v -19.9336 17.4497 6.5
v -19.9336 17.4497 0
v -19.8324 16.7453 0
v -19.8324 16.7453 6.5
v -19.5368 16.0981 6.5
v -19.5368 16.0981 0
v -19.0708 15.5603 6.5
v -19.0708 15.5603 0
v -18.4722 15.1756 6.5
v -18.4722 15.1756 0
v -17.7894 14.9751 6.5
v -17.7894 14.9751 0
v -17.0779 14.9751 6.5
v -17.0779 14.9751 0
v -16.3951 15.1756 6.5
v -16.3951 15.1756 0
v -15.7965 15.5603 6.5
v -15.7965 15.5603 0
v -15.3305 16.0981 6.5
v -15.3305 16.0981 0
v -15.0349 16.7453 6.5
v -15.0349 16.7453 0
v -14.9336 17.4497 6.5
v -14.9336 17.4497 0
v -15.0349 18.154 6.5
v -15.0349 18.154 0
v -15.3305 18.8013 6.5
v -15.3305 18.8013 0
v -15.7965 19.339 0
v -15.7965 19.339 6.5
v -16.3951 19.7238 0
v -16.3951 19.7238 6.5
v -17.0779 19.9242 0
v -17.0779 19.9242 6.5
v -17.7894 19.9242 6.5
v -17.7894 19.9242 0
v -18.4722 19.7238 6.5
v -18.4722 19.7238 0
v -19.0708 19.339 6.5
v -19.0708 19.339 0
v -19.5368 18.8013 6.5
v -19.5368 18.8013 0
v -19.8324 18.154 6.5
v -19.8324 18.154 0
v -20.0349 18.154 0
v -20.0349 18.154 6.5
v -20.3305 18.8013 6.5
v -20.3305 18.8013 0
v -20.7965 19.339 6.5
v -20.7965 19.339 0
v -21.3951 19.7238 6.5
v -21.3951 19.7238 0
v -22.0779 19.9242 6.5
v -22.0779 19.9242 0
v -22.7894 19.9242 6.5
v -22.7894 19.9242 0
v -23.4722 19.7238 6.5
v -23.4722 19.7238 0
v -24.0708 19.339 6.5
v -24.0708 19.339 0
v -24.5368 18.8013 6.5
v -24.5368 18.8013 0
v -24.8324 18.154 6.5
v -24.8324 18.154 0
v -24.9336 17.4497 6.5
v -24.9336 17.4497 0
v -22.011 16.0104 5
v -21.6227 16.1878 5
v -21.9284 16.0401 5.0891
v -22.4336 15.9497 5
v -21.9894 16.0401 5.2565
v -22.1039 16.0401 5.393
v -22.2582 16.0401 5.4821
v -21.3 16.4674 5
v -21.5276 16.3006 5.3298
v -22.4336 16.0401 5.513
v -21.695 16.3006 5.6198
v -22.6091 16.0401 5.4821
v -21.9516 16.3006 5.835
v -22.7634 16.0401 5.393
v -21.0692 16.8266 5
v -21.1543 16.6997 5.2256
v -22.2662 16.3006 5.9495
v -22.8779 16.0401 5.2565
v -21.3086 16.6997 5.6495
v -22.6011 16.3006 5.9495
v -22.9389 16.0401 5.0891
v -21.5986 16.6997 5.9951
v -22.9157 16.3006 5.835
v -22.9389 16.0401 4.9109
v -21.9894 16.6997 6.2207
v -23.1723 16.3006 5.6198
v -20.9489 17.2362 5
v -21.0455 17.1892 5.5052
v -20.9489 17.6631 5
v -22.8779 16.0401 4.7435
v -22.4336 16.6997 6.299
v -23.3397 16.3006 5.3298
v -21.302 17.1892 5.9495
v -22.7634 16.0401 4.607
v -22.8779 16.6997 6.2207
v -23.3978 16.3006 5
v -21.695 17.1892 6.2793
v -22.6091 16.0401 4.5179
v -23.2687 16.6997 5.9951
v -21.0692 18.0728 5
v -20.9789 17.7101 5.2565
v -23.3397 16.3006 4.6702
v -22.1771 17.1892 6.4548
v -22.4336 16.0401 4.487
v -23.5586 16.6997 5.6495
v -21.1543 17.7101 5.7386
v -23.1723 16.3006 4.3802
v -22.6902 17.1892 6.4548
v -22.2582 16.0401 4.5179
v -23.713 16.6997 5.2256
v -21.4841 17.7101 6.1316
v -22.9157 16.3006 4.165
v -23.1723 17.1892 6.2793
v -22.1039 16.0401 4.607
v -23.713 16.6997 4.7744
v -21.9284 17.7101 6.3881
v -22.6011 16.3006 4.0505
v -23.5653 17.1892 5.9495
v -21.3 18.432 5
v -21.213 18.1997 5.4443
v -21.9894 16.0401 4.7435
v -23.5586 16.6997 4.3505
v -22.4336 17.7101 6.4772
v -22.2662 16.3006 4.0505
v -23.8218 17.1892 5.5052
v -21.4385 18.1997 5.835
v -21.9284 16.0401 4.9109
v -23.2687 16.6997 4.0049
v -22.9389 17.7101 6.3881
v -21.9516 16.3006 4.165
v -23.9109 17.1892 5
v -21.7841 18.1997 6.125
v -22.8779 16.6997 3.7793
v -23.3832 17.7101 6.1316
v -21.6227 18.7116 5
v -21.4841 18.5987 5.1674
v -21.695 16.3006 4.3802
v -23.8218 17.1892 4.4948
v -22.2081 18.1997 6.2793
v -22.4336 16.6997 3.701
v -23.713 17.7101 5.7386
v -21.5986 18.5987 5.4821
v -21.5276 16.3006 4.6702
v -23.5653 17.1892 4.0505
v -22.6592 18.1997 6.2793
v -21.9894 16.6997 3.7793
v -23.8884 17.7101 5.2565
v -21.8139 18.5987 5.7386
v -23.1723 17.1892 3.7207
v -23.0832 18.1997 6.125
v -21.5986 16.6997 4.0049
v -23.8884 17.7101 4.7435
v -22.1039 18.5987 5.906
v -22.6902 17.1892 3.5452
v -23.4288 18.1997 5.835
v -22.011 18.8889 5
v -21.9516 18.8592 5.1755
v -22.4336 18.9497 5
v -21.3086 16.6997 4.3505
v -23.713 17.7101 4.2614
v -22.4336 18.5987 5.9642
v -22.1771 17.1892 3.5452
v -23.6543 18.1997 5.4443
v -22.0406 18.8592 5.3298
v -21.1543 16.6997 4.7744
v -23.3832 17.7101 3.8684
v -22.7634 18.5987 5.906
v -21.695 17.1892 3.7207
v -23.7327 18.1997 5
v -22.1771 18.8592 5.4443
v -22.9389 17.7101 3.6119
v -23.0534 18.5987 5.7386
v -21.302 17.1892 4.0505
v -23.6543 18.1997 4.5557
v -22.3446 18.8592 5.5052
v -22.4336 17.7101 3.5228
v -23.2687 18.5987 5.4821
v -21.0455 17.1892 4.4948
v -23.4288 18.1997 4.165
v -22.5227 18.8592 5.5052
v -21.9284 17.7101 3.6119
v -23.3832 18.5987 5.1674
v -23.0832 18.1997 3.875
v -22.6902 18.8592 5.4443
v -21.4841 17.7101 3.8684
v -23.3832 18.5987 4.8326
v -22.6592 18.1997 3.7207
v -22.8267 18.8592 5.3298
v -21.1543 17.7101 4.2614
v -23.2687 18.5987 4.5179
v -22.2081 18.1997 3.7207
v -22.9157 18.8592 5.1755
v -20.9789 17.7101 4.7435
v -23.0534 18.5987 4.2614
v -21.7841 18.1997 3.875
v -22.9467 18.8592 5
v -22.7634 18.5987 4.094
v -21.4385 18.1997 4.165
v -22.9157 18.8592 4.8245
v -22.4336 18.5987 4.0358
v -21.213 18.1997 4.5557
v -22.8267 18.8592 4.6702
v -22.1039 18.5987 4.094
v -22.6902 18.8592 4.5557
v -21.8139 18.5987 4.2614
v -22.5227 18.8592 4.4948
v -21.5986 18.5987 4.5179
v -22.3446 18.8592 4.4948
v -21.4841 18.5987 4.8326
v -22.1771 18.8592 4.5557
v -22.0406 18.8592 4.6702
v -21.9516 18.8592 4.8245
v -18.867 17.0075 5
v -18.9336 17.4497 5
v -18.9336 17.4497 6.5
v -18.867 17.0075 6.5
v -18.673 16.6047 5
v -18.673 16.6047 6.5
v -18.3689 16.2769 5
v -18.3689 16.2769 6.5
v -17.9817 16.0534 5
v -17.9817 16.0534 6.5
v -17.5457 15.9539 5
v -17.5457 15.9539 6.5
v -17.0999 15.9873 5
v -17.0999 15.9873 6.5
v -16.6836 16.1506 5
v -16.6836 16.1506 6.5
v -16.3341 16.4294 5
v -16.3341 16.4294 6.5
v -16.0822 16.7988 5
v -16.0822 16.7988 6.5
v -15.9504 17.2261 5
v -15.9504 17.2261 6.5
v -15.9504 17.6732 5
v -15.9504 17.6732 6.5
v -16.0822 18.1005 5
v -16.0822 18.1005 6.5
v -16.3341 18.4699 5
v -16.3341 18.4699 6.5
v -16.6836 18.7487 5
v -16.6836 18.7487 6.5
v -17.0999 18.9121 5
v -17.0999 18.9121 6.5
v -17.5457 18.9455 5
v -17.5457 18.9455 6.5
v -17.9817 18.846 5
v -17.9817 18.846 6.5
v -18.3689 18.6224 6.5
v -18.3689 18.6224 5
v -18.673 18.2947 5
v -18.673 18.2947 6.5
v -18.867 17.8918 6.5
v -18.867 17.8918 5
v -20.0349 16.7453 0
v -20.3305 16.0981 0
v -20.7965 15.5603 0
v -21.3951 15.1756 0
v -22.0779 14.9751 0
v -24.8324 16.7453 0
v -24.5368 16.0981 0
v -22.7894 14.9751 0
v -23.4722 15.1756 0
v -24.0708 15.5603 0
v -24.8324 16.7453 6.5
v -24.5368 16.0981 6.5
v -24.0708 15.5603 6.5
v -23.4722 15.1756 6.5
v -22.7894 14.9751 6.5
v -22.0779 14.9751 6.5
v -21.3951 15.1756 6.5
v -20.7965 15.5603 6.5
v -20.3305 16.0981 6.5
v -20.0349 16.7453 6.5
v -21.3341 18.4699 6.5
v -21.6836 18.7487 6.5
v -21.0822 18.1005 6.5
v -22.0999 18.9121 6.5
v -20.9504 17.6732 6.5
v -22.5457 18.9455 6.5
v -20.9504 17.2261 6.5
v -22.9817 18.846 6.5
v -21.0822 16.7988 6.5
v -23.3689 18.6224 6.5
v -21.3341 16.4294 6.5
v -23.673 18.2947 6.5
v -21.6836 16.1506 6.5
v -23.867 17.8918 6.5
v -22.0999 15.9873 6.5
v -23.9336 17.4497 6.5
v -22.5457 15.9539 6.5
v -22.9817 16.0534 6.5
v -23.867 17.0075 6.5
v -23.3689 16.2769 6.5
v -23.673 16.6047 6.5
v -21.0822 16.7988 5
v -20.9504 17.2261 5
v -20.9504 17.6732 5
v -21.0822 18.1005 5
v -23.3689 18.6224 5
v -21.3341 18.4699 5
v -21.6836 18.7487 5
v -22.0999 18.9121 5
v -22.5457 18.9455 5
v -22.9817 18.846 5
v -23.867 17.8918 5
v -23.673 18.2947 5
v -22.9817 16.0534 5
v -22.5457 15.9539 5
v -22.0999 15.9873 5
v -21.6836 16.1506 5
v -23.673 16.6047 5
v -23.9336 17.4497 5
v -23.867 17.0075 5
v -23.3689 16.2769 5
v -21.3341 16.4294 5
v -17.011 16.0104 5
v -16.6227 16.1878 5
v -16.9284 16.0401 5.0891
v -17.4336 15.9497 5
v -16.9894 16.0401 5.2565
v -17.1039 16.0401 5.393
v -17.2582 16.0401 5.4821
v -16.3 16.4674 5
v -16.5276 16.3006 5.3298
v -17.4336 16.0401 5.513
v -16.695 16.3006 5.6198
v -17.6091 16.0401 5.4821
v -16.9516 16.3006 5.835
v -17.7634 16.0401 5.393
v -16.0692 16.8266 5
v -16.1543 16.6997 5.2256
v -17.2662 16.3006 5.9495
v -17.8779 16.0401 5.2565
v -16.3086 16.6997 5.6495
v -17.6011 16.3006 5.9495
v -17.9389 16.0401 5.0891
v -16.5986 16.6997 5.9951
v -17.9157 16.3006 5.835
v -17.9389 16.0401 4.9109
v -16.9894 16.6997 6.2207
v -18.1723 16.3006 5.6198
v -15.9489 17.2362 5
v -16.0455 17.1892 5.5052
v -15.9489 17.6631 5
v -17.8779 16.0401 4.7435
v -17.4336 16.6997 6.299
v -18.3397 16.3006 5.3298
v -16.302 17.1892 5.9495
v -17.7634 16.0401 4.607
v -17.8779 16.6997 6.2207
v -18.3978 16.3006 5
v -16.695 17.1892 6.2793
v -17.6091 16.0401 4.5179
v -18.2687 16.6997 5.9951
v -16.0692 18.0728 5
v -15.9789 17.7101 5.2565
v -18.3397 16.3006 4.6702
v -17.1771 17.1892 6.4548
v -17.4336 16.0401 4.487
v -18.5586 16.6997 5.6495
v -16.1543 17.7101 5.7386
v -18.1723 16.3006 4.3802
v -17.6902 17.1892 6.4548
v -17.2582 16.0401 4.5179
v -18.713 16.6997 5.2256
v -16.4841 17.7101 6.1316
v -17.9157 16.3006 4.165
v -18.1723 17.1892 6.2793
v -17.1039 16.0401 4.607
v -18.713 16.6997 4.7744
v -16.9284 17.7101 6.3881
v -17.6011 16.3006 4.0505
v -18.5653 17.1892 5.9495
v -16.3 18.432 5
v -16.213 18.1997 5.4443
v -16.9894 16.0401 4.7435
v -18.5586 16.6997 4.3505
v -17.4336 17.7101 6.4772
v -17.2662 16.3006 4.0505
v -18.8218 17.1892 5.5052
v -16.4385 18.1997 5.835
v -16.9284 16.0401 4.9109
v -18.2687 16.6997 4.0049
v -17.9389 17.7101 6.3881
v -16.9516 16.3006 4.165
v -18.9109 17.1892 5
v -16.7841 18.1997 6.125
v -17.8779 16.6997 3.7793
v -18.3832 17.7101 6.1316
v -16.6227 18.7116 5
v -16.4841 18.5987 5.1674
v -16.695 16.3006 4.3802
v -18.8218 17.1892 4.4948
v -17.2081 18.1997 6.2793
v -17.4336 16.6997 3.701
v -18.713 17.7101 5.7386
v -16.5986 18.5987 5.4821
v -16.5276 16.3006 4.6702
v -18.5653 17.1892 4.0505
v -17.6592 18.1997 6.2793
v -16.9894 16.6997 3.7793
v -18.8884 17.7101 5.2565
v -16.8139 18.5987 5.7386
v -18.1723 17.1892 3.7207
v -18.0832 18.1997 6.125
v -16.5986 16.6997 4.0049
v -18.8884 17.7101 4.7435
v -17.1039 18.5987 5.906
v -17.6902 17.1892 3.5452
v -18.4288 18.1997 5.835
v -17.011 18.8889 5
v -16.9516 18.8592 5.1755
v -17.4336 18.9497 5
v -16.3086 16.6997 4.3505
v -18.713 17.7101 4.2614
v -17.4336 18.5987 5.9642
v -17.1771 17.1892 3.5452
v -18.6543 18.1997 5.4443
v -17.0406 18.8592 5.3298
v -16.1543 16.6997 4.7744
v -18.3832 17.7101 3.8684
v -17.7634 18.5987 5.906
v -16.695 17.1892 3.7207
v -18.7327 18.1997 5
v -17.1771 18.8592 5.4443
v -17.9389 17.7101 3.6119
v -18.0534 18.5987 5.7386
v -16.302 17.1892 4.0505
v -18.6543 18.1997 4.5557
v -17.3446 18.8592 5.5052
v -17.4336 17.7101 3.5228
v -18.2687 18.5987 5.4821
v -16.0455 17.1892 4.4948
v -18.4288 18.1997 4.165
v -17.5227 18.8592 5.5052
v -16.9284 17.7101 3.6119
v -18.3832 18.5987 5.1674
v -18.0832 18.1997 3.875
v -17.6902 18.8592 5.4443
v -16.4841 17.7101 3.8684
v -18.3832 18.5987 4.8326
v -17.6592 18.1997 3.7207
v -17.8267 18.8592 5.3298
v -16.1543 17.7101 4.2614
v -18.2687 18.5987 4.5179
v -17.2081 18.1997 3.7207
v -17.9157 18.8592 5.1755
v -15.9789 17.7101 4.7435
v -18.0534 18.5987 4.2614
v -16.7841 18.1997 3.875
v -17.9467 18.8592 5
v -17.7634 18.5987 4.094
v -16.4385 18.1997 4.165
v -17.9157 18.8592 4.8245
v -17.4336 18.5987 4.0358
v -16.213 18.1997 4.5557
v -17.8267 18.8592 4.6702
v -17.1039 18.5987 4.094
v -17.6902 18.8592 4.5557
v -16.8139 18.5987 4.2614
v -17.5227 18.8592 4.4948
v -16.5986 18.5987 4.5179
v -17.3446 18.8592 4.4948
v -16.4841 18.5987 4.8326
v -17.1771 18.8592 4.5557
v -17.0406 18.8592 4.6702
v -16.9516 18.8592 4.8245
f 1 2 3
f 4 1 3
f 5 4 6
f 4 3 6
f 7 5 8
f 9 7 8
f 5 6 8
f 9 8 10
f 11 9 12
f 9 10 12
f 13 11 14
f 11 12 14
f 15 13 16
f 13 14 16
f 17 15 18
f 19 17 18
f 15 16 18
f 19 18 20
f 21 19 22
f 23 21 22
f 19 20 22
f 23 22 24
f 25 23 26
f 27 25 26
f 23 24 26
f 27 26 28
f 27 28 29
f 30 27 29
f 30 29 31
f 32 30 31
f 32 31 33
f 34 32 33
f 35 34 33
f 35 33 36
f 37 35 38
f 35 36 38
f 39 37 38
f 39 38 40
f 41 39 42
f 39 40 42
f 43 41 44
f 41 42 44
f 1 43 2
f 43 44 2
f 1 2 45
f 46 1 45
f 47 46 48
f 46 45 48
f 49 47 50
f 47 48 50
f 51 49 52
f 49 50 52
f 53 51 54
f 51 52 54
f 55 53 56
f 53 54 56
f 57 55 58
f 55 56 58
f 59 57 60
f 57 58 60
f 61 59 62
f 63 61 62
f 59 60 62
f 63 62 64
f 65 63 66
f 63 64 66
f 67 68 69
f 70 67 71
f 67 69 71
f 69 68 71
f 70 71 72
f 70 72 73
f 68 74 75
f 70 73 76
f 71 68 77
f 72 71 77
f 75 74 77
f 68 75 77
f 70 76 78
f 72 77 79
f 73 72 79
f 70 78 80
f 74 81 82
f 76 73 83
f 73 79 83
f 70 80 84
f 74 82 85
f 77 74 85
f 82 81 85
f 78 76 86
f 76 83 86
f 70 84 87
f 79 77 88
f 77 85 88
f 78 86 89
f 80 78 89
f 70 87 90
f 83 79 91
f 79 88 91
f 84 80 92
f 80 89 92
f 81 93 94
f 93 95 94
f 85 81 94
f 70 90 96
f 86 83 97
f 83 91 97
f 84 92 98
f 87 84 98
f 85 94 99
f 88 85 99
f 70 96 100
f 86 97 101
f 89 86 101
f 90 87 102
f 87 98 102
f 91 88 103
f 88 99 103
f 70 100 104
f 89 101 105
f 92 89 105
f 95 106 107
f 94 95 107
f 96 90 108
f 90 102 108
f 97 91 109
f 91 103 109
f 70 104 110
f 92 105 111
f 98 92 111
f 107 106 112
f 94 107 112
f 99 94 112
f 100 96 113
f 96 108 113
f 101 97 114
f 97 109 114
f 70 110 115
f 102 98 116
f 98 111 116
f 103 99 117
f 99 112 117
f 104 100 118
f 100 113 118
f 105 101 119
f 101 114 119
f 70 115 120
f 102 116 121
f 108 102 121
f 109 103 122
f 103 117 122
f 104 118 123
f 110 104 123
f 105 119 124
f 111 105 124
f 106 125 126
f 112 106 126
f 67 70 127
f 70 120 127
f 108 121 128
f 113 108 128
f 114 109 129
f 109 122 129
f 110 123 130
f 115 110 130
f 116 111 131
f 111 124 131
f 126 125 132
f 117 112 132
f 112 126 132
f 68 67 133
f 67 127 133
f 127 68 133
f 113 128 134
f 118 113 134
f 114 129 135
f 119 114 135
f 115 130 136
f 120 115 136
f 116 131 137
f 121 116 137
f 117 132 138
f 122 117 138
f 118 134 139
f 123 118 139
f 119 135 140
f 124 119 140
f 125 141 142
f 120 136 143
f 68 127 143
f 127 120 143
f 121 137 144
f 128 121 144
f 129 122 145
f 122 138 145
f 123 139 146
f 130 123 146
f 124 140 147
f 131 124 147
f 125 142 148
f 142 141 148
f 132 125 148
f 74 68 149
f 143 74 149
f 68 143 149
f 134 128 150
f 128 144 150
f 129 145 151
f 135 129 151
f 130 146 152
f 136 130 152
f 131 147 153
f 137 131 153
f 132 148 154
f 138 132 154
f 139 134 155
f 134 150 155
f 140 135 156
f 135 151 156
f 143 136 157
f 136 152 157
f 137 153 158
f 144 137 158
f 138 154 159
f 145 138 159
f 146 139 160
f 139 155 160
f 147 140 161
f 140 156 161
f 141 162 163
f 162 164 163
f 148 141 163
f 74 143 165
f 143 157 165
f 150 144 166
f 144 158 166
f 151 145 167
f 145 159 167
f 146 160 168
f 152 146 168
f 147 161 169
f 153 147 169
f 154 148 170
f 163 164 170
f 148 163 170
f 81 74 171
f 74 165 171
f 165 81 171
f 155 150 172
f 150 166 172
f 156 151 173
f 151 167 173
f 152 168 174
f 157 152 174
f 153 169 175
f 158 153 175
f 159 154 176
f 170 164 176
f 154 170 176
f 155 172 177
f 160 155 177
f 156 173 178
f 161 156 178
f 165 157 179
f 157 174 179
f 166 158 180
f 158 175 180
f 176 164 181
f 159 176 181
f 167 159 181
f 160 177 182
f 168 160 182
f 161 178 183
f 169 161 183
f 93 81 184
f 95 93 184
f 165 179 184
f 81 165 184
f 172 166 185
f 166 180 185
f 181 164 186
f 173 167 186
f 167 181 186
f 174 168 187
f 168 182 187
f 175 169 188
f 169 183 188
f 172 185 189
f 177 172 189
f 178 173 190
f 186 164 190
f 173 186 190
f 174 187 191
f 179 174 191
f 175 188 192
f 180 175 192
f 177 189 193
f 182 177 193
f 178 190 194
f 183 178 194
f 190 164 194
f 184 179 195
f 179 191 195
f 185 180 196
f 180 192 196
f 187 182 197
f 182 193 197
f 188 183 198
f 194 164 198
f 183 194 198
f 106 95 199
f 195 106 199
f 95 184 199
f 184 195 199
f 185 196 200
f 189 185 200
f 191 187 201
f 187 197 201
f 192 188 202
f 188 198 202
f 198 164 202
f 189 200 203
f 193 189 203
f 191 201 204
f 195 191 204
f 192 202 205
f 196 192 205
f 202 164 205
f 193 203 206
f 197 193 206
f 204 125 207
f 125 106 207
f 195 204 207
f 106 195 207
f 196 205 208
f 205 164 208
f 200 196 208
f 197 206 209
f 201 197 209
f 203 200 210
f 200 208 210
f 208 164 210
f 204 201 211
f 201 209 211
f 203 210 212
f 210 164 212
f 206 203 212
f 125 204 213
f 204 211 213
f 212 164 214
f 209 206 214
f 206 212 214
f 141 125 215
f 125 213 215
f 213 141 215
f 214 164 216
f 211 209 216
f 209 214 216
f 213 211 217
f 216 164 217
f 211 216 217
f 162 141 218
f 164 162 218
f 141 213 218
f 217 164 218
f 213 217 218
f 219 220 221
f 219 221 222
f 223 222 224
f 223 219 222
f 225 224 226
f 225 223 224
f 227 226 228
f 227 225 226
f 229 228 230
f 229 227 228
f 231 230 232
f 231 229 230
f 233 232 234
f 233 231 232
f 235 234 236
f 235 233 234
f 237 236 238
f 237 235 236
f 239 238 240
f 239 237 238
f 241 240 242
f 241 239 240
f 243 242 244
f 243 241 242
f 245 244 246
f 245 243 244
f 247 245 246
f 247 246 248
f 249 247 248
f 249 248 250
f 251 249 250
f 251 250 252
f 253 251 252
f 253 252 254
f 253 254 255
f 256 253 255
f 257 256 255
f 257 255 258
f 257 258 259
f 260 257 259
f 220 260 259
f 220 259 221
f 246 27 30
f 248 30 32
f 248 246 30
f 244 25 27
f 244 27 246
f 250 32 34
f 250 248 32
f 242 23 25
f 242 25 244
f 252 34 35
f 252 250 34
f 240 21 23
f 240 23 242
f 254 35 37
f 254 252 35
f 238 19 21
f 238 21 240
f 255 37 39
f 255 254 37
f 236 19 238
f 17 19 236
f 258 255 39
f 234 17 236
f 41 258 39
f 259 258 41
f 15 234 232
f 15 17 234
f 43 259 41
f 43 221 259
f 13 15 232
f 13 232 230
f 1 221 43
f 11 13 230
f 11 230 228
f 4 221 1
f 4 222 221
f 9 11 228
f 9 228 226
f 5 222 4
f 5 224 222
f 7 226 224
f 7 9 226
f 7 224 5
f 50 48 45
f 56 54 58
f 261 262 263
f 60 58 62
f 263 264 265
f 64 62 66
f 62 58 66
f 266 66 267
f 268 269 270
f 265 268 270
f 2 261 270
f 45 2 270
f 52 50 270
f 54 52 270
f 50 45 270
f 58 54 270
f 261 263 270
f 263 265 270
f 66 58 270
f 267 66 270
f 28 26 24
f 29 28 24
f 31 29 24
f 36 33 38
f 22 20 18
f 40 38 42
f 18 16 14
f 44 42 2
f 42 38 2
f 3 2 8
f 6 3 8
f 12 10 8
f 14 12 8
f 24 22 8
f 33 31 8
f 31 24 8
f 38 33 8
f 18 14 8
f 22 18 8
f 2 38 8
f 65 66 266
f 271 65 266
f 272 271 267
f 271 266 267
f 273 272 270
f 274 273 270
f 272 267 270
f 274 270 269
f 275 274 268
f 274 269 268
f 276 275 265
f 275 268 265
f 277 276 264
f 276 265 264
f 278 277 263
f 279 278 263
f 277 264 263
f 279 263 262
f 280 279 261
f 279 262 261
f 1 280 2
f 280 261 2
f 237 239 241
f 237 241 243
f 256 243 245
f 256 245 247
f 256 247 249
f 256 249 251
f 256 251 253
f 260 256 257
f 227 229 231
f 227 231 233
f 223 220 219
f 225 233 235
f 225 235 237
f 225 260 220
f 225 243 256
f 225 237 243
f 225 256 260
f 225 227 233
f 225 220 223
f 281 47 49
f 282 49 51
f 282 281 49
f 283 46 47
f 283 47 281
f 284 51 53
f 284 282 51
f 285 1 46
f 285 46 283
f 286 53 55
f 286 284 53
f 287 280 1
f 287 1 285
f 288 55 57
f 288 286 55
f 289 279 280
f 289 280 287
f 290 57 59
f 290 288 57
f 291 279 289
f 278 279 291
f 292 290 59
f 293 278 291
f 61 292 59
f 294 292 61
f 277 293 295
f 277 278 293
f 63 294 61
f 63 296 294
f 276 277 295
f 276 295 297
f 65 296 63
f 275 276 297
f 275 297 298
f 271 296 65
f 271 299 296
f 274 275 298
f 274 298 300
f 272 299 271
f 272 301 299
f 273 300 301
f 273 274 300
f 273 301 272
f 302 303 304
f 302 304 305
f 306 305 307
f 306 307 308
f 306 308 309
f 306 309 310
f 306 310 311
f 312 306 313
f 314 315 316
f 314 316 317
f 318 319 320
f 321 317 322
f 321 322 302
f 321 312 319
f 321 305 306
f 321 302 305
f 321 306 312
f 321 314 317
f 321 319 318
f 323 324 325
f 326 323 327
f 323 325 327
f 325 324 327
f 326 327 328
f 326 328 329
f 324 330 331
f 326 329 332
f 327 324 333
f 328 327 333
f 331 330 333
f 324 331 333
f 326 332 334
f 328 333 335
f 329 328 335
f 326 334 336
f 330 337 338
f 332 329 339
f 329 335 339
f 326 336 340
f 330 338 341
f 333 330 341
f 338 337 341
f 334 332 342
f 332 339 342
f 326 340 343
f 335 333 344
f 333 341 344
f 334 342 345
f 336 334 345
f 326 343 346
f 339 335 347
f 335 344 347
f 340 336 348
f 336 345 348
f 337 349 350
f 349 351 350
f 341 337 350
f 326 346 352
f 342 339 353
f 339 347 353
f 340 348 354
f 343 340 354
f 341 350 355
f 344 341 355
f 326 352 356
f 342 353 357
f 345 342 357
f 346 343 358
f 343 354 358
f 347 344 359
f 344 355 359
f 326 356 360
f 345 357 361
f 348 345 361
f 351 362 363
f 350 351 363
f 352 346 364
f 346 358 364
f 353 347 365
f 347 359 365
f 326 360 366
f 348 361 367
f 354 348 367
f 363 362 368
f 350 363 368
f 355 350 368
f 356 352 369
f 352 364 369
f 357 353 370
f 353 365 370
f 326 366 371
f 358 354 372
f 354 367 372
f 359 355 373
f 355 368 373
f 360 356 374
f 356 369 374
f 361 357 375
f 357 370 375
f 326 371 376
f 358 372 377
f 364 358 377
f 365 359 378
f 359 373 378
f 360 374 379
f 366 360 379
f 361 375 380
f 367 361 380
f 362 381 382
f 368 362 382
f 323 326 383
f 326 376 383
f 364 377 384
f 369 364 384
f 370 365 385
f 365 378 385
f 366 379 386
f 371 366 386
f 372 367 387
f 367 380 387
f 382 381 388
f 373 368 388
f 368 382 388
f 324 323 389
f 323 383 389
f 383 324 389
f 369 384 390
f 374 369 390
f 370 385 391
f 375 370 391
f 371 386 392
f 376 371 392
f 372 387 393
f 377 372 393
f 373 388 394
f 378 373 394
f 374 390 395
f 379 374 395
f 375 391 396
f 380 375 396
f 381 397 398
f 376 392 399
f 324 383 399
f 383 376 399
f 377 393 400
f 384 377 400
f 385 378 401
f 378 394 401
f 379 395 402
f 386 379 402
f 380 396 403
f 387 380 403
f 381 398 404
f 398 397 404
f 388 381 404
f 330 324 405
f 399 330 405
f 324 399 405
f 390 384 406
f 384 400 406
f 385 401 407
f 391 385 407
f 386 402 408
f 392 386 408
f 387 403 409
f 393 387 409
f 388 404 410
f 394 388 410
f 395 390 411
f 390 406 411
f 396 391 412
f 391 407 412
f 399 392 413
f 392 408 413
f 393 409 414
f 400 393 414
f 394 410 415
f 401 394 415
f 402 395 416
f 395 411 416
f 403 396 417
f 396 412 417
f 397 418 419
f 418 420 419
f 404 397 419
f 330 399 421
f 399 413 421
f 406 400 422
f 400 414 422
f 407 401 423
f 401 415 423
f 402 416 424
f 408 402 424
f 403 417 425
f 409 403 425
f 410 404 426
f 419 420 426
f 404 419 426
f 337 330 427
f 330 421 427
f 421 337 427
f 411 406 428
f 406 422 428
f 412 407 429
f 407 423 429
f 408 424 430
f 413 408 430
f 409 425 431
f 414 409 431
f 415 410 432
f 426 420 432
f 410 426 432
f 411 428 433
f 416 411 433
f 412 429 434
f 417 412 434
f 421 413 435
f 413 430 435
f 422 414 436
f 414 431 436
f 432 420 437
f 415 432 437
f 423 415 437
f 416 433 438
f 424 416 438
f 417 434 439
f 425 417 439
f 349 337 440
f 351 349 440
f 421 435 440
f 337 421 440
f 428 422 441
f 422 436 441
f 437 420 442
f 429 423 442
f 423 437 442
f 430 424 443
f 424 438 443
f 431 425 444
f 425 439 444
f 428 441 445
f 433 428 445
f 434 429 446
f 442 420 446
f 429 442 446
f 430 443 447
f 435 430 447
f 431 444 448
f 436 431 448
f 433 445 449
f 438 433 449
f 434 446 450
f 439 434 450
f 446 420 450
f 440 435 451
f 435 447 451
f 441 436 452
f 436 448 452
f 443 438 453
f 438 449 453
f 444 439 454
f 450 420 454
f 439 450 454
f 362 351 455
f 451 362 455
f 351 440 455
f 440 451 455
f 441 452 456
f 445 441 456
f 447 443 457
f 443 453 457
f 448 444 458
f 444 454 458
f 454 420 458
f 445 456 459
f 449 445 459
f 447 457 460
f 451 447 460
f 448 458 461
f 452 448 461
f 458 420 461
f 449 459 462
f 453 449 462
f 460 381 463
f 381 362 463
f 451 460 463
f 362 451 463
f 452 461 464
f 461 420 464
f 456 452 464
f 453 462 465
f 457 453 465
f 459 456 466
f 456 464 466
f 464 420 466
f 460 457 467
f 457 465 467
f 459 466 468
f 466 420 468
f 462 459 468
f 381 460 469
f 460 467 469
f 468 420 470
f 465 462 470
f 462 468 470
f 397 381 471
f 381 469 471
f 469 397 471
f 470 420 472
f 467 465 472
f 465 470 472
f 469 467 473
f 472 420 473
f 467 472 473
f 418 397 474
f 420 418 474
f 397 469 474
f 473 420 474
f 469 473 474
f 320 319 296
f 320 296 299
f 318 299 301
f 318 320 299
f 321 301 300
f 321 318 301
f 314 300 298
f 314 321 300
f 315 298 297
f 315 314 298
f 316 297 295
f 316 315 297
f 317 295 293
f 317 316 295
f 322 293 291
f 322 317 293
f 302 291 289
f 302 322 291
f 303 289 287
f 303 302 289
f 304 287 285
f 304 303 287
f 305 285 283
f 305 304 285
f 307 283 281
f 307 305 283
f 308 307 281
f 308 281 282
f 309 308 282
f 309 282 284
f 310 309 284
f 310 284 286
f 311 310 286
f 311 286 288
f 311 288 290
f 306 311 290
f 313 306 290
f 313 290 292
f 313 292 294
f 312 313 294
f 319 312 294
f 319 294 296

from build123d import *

# Parameters (mm, degrees)
SKETCH_1_R      = 2.5
SKETCH_1_R_2    = 1.5
EXTRUDE_1_DEPTH = 6.5
SKETCH_2_R      = 2.5
SKETCH_2_R_2    = 1.5
EXTRUDE_2_DEPTH = 6.5
SKETCH_3_R      = 1.5
EXTRUDE_3_DEPTH = 5


with BuildPart() as part:
    # 草图1 → 凸台-拉伸1 (new body)
    with BuildSketch(Plane.XY):
        with Locations(Location((-22.433647208, 17.449673572, 0), (0, 0, 180))):
            Circle(SKETCH_1_R)
        with Locations(Location((-22.433647208, 17.449673572, 0), (0, 0, 180))):
            Circle(SKETCH_1_R_2, mode=Mode.SUBTRACT)
    extrude(amount=EXTRUDE_1_DEPTH)



with BuildPart() as body_2:
    # 草图2 → 凸台-拉伸2 (new body)
    with BuildSketch(Plane.XY):
        with Locations(Location((-17.433647208, 17.449673572, 0), (0, 0, 180))):
            Circle(SKETCH_2_R)
        with Locations(Location((-17.433647208, 17.449673572, 0), (0, 0, 180))):
            Circle(SKETCH_2_R_2, mode=Mode.SUBTRACT)
    extrude(amount=EXTRUDE_2_DEPTH)


with BuildPart() as part_1:
    add(part.part)

    add(body_2.part)  # 凸台-拉伸3 merges body 2
    # 草图3 → 凸台-拉伸3 (add)
    with BuildSketch(Plane.XY):
        with Locations(Location((-22.433647208, 17.449673572, 0), (0, 0, 180))):
            Circle(SKETCH_3_R)
        with Locations(Location((-17.433647208, 17.449673572, 0), (0, 0, 180))):
            Circle(SKETCH_3_R)
    extrude(amount=EXTRUDE_3_DEPTH)


with BuildPart() as body_2_2:
    # 草图4 → 旋转1 (revolve)
    with BuildSketch(Plane.XY.offset(5)):
        with BuildLine():
            Line((-22.433647208, 18.949673572), (-22.433647208, 15.949673572))
            ThreePointArc((-22.433647208, 15.949673572), (-20.933647208, 17.449673572), (-22.433647208, 18.949673572))
        make_face()
    revolve(axis=Axis((-22.433647208, 18.949673572, 5), (0, -1, 0)))


with BuildPart() as body_3:
    # 草图5 → 旋转2 (revolve)
    with BuildSketch(Plane.XY.offset(5)):
        with BuildLine():
            Line((-17.433647208, 18.949673572), (-17.433647208, 15.949673572))
            ThreePointArc((-17.433647208, 15.949673572), (-15.933647208, 17.449673572), (-17.433647208, 18.949673572))
        make_face()
    revolve(axis=Axis((-17.433647208, 18.949673572, 5), (0, -1, 0)))


solid = Compound([part_1.part, body_2_2.part, body_3.part])
